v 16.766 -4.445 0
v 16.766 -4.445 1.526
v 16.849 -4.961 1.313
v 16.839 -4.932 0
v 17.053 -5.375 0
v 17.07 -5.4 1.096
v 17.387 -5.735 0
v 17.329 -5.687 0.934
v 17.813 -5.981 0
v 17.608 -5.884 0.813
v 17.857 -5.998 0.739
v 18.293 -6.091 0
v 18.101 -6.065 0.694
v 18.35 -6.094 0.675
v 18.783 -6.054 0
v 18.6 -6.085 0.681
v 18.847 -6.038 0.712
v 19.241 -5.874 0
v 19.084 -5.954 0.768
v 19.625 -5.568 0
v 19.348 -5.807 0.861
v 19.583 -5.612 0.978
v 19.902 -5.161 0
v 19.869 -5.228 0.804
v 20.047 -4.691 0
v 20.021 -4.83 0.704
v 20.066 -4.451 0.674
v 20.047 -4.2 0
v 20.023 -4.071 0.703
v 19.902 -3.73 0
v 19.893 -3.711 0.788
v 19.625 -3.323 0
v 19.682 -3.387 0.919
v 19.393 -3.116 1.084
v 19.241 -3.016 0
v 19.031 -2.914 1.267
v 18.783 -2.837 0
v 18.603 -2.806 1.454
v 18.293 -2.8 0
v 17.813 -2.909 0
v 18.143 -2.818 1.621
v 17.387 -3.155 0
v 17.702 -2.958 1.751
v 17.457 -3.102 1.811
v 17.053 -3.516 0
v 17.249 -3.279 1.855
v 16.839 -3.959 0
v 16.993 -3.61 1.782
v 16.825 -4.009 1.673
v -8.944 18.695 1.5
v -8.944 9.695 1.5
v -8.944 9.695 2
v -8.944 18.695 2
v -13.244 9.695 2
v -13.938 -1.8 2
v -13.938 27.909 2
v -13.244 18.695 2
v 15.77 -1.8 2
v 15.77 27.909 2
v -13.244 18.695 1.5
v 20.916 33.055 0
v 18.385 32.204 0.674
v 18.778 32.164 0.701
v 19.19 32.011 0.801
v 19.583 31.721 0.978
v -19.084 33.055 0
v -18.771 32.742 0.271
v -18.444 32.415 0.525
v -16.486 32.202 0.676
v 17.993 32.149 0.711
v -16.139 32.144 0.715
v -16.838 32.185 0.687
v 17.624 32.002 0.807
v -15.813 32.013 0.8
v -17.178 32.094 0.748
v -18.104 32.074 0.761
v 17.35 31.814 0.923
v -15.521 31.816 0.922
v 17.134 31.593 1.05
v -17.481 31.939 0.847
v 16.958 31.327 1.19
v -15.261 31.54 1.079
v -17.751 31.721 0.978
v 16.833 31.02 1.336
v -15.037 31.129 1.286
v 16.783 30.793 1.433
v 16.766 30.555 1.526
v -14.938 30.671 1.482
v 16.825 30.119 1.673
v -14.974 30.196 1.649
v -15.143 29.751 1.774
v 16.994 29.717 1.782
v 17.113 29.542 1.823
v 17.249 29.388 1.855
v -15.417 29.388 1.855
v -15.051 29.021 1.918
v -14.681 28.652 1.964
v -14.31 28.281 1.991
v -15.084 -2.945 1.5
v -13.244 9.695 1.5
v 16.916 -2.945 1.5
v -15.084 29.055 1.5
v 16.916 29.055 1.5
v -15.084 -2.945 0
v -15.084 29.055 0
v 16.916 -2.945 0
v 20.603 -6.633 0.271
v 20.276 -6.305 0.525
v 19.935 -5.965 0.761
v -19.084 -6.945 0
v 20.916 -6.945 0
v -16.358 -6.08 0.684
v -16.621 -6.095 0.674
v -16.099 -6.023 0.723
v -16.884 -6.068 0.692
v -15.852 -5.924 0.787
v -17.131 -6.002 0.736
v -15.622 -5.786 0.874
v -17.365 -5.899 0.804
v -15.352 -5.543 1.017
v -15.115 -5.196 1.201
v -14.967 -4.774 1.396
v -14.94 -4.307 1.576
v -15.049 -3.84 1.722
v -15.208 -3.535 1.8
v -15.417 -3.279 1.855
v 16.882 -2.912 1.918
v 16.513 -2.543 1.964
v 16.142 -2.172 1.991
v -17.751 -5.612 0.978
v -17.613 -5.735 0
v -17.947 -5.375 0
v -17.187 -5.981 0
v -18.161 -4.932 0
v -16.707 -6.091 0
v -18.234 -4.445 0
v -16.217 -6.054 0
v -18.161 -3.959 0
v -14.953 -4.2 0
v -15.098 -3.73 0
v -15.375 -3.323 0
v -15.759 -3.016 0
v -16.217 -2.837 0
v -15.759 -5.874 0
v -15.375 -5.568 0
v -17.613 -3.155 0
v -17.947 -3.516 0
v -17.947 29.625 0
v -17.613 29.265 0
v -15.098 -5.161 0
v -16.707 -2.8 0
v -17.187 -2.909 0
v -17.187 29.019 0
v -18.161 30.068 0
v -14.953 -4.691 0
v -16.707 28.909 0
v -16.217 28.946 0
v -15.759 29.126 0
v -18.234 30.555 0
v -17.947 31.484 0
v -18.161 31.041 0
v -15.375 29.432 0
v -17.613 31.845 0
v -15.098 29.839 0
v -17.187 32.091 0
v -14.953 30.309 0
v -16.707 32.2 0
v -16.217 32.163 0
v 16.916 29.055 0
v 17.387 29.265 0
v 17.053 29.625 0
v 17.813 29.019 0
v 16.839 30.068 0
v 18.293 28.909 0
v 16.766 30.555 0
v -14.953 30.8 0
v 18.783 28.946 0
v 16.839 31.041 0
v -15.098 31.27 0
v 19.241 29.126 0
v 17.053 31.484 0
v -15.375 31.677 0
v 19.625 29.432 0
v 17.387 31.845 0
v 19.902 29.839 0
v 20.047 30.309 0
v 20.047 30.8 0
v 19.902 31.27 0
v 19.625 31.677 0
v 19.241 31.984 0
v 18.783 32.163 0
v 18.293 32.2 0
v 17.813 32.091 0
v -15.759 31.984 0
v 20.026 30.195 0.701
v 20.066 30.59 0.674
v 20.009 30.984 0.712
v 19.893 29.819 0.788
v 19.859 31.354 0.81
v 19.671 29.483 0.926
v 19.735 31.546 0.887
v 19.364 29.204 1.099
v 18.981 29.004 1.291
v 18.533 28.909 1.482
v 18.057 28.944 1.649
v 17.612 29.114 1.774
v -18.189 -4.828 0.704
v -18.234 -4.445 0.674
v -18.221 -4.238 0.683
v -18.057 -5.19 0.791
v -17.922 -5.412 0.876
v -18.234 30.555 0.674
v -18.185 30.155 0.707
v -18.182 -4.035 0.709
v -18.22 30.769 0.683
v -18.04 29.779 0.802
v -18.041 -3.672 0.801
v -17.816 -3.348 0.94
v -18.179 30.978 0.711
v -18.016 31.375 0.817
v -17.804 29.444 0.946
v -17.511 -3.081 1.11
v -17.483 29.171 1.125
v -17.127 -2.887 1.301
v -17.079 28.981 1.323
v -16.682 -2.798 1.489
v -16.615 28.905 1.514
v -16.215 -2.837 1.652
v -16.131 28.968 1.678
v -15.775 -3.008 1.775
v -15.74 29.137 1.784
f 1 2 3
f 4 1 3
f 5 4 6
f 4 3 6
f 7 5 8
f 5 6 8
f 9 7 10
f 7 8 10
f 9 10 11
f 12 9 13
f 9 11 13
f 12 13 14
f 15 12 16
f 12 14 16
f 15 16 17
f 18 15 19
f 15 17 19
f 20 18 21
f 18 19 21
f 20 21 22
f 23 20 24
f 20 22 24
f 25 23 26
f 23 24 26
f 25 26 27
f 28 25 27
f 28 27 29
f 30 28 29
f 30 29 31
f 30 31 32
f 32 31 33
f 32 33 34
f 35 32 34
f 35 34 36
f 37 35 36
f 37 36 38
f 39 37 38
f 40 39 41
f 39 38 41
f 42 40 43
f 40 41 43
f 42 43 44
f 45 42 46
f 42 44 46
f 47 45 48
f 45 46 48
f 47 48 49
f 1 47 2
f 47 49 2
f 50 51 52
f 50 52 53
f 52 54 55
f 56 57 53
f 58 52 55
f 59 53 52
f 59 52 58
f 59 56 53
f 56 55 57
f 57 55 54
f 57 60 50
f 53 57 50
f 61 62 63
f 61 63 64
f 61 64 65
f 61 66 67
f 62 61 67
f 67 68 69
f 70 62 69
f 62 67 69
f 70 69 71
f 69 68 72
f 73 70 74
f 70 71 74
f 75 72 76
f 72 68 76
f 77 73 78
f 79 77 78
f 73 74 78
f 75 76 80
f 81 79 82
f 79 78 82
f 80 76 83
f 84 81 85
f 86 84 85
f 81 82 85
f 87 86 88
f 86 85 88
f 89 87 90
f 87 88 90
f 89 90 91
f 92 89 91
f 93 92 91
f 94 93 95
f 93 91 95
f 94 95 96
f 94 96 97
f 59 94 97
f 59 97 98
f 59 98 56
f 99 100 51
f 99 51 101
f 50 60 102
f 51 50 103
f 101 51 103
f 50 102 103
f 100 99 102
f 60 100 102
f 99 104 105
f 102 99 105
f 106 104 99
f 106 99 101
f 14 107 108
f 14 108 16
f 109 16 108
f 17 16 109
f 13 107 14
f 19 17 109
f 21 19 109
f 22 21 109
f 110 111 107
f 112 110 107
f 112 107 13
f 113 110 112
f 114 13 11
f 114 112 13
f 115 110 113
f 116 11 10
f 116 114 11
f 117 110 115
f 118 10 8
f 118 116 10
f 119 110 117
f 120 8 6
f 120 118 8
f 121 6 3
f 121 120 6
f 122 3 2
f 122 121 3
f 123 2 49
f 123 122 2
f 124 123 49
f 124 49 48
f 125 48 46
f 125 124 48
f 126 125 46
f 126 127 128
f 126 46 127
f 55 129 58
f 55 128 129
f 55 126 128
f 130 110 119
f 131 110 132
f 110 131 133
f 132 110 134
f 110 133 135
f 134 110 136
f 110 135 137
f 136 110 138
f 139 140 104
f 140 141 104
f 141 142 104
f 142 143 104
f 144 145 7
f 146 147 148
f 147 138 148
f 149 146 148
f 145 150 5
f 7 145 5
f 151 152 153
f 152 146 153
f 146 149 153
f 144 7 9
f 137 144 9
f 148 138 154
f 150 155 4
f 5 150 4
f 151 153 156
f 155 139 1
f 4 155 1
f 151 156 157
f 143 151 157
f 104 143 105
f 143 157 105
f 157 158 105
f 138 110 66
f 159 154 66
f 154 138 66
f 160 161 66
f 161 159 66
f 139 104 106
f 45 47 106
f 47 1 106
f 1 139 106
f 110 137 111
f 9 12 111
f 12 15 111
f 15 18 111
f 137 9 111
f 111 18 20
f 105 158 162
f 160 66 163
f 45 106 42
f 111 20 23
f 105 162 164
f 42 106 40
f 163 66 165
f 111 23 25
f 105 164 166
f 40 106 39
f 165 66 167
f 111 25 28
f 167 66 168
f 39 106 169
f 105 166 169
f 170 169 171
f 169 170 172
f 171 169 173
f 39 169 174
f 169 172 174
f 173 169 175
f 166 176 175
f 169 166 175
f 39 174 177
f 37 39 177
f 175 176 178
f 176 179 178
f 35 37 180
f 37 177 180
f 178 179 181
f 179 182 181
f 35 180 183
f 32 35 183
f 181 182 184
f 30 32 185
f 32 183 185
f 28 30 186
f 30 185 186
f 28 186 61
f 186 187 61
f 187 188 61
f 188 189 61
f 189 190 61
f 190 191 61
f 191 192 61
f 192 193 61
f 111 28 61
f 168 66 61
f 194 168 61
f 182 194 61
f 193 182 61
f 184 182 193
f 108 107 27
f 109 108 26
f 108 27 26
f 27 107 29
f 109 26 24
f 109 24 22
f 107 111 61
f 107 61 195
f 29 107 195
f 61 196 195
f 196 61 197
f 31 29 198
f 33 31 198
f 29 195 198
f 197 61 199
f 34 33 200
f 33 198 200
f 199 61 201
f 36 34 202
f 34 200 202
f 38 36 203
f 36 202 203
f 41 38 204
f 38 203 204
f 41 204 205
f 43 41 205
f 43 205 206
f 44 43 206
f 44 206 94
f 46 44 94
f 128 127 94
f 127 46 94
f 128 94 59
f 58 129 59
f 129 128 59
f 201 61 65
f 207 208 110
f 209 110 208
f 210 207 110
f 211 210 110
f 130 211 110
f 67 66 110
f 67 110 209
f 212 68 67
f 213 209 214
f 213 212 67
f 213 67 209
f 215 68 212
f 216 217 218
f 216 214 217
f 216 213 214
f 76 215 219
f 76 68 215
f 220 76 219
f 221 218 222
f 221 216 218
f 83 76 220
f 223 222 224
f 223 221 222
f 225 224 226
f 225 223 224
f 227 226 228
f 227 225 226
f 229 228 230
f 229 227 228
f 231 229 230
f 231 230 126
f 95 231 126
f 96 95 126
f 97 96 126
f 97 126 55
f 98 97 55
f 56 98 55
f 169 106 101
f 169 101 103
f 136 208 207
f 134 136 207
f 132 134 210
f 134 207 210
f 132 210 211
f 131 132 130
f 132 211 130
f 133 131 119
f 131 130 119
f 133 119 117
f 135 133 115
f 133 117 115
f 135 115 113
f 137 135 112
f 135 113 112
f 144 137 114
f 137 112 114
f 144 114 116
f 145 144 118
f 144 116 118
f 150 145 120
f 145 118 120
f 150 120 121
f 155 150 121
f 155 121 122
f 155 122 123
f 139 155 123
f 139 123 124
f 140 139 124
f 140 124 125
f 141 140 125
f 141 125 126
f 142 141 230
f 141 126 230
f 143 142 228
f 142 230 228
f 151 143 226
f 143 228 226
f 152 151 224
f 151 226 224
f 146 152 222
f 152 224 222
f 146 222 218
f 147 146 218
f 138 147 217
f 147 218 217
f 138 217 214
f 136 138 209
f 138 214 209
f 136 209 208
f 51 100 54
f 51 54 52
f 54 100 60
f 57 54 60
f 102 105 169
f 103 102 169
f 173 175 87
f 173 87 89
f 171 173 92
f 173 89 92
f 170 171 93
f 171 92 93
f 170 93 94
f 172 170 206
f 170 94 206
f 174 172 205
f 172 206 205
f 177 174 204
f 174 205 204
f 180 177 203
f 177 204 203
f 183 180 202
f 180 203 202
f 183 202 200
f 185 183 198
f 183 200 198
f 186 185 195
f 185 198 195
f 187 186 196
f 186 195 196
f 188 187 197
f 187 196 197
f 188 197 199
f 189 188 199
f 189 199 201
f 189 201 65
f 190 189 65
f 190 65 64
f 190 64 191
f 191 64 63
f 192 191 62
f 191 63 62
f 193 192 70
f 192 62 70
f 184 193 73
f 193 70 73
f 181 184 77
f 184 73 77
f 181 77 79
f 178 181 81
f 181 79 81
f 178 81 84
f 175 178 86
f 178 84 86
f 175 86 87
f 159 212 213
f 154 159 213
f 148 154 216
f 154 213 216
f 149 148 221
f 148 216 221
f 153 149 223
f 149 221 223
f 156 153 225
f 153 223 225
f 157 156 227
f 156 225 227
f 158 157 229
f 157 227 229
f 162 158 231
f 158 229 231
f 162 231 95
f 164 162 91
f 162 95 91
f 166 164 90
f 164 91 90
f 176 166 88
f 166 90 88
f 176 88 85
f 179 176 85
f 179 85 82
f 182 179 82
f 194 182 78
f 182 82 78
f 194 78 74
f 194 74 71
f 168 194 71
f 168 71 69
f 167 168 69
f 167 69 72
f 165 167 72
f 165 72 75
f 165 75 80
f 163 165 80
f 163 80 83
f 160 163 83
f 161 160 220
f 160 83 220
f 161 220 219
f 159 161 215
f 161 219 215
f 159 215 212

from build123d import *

# Parameters (mm, degrees)
F0_W        = 40
F0_H        = 40
F1_DEPTH    = 2
F2_T1_DEPTH = 65.7293606605
F2_T3_DEPTH = 65.7293606605
F3_D        = 3.3
F4_W        = 4.3
F4_H        = 9
F5_DEPTH    = 25
F6_W        = 32
F6_H        = 32
F7_DEPTH    = 1.5


# Not quite as in the source:
# - a fillet or chamfer that OpenCascade refuses, or shapes differently, is made with other operations: its cross-section is extruded or revolved along the edge and cut away or added


with BuildPart() as f1:
    # F0 (on Top) → F1 (new body)
    with BuildSketch(Plane.XY):
        with Locations((0.9159009159, 13.0545736344)):
            Rectangle(F0_W, F0_H)
    extrude(amount=F1_DEPTH)

    # F2: fillet of radius 7.62 on 4 edges, made by hand

    # F2_s2 → F2_t1 (cut)
    with BuildSketch(Plane.XZ.offset(-45.9192539647)):
        with BuildLine():
            ThreePointArc((-19.0840990841, 0), (-16.6986617004, 1.4824221221), (-13.938226952, 2))
            Line((-13.938226952, 2), (-19.0840990841, 2))
            Line((-19.0840990841, 2), (-19.0840990841, 0))
        make_face()
        with BuildLine():
            ThreePointArc((20.9159009159, 0), (18.5304635321, 1.4824221221), (15.7700287838, 2))
            Line((15.7700287838, 2), (20.9159009159, 2))
            Line((20.9159009159, 2), (20.9159009159, 0))
        make_face()
    extrude(amount=F2_T1_DEPTH, mode=Mode.SUBTRACT)

    # F2_s4 → F2_t3 (cut)
    with BuildSketch(Plane.YZ.offset(-31.9487794144)):
        with BuildLine():
            ThreePointArc((-6.9454263656, 0), (-4.5599889818, 1.4824221221), (-1.7995542335, 2))
            Line((-1.7995542335, 2), (-6.9454263656, 2))
            Line((-6.9454263656, 2), (-6.9454263656, 0))
        make_face()
        with BuildLine():
            ThreePointArc((33.0545736344, 0), (30.6691362507, 1.4824221221), (27.9087015023, 2))
            Line((27.9087015023, 2), (33.0545736344, 2))
            Line((33.0545736344, 2), (33.0545736344, 0))
        make_face()
    extrude(amount=F2_T3_DEPTH, mode=Mode.SUBTRACT)

    # F3 (through all)
    with Locations(Plane(origin=(0, 0, 0), x_dir=(1, 0, 0), z_dir=(0, 0, -1))):
        with Locations((-16.5840990841, 4.4454263656), (-16.5840990841, -30.5545736344), (18.4159009159, -30.5545736344), (18.4159009159, 4.4454263656)):
            Hole(F3_D / 2)

    # F4 (on Top) → F5 (cut)
    with BuildSketch(Plane.XY):
        with Locations((-11.0940990841, 14.1945736344)):
            Rectangle(F4_W, F4_H)
    extrude(amount=F5_DEPTH, mode=Mode.SUBTRACT)

    # F6 (on Top) → F7 (cut)
    with BuildSketch(Plane.XY):
        with Locations((0.9159009159, 13.0545736344)):
            Rectangle(F6_W, F6_H)
    extrude(amount=F7_DEPTH, mode=Mode.SUBTRACT)


solid = f1.part
